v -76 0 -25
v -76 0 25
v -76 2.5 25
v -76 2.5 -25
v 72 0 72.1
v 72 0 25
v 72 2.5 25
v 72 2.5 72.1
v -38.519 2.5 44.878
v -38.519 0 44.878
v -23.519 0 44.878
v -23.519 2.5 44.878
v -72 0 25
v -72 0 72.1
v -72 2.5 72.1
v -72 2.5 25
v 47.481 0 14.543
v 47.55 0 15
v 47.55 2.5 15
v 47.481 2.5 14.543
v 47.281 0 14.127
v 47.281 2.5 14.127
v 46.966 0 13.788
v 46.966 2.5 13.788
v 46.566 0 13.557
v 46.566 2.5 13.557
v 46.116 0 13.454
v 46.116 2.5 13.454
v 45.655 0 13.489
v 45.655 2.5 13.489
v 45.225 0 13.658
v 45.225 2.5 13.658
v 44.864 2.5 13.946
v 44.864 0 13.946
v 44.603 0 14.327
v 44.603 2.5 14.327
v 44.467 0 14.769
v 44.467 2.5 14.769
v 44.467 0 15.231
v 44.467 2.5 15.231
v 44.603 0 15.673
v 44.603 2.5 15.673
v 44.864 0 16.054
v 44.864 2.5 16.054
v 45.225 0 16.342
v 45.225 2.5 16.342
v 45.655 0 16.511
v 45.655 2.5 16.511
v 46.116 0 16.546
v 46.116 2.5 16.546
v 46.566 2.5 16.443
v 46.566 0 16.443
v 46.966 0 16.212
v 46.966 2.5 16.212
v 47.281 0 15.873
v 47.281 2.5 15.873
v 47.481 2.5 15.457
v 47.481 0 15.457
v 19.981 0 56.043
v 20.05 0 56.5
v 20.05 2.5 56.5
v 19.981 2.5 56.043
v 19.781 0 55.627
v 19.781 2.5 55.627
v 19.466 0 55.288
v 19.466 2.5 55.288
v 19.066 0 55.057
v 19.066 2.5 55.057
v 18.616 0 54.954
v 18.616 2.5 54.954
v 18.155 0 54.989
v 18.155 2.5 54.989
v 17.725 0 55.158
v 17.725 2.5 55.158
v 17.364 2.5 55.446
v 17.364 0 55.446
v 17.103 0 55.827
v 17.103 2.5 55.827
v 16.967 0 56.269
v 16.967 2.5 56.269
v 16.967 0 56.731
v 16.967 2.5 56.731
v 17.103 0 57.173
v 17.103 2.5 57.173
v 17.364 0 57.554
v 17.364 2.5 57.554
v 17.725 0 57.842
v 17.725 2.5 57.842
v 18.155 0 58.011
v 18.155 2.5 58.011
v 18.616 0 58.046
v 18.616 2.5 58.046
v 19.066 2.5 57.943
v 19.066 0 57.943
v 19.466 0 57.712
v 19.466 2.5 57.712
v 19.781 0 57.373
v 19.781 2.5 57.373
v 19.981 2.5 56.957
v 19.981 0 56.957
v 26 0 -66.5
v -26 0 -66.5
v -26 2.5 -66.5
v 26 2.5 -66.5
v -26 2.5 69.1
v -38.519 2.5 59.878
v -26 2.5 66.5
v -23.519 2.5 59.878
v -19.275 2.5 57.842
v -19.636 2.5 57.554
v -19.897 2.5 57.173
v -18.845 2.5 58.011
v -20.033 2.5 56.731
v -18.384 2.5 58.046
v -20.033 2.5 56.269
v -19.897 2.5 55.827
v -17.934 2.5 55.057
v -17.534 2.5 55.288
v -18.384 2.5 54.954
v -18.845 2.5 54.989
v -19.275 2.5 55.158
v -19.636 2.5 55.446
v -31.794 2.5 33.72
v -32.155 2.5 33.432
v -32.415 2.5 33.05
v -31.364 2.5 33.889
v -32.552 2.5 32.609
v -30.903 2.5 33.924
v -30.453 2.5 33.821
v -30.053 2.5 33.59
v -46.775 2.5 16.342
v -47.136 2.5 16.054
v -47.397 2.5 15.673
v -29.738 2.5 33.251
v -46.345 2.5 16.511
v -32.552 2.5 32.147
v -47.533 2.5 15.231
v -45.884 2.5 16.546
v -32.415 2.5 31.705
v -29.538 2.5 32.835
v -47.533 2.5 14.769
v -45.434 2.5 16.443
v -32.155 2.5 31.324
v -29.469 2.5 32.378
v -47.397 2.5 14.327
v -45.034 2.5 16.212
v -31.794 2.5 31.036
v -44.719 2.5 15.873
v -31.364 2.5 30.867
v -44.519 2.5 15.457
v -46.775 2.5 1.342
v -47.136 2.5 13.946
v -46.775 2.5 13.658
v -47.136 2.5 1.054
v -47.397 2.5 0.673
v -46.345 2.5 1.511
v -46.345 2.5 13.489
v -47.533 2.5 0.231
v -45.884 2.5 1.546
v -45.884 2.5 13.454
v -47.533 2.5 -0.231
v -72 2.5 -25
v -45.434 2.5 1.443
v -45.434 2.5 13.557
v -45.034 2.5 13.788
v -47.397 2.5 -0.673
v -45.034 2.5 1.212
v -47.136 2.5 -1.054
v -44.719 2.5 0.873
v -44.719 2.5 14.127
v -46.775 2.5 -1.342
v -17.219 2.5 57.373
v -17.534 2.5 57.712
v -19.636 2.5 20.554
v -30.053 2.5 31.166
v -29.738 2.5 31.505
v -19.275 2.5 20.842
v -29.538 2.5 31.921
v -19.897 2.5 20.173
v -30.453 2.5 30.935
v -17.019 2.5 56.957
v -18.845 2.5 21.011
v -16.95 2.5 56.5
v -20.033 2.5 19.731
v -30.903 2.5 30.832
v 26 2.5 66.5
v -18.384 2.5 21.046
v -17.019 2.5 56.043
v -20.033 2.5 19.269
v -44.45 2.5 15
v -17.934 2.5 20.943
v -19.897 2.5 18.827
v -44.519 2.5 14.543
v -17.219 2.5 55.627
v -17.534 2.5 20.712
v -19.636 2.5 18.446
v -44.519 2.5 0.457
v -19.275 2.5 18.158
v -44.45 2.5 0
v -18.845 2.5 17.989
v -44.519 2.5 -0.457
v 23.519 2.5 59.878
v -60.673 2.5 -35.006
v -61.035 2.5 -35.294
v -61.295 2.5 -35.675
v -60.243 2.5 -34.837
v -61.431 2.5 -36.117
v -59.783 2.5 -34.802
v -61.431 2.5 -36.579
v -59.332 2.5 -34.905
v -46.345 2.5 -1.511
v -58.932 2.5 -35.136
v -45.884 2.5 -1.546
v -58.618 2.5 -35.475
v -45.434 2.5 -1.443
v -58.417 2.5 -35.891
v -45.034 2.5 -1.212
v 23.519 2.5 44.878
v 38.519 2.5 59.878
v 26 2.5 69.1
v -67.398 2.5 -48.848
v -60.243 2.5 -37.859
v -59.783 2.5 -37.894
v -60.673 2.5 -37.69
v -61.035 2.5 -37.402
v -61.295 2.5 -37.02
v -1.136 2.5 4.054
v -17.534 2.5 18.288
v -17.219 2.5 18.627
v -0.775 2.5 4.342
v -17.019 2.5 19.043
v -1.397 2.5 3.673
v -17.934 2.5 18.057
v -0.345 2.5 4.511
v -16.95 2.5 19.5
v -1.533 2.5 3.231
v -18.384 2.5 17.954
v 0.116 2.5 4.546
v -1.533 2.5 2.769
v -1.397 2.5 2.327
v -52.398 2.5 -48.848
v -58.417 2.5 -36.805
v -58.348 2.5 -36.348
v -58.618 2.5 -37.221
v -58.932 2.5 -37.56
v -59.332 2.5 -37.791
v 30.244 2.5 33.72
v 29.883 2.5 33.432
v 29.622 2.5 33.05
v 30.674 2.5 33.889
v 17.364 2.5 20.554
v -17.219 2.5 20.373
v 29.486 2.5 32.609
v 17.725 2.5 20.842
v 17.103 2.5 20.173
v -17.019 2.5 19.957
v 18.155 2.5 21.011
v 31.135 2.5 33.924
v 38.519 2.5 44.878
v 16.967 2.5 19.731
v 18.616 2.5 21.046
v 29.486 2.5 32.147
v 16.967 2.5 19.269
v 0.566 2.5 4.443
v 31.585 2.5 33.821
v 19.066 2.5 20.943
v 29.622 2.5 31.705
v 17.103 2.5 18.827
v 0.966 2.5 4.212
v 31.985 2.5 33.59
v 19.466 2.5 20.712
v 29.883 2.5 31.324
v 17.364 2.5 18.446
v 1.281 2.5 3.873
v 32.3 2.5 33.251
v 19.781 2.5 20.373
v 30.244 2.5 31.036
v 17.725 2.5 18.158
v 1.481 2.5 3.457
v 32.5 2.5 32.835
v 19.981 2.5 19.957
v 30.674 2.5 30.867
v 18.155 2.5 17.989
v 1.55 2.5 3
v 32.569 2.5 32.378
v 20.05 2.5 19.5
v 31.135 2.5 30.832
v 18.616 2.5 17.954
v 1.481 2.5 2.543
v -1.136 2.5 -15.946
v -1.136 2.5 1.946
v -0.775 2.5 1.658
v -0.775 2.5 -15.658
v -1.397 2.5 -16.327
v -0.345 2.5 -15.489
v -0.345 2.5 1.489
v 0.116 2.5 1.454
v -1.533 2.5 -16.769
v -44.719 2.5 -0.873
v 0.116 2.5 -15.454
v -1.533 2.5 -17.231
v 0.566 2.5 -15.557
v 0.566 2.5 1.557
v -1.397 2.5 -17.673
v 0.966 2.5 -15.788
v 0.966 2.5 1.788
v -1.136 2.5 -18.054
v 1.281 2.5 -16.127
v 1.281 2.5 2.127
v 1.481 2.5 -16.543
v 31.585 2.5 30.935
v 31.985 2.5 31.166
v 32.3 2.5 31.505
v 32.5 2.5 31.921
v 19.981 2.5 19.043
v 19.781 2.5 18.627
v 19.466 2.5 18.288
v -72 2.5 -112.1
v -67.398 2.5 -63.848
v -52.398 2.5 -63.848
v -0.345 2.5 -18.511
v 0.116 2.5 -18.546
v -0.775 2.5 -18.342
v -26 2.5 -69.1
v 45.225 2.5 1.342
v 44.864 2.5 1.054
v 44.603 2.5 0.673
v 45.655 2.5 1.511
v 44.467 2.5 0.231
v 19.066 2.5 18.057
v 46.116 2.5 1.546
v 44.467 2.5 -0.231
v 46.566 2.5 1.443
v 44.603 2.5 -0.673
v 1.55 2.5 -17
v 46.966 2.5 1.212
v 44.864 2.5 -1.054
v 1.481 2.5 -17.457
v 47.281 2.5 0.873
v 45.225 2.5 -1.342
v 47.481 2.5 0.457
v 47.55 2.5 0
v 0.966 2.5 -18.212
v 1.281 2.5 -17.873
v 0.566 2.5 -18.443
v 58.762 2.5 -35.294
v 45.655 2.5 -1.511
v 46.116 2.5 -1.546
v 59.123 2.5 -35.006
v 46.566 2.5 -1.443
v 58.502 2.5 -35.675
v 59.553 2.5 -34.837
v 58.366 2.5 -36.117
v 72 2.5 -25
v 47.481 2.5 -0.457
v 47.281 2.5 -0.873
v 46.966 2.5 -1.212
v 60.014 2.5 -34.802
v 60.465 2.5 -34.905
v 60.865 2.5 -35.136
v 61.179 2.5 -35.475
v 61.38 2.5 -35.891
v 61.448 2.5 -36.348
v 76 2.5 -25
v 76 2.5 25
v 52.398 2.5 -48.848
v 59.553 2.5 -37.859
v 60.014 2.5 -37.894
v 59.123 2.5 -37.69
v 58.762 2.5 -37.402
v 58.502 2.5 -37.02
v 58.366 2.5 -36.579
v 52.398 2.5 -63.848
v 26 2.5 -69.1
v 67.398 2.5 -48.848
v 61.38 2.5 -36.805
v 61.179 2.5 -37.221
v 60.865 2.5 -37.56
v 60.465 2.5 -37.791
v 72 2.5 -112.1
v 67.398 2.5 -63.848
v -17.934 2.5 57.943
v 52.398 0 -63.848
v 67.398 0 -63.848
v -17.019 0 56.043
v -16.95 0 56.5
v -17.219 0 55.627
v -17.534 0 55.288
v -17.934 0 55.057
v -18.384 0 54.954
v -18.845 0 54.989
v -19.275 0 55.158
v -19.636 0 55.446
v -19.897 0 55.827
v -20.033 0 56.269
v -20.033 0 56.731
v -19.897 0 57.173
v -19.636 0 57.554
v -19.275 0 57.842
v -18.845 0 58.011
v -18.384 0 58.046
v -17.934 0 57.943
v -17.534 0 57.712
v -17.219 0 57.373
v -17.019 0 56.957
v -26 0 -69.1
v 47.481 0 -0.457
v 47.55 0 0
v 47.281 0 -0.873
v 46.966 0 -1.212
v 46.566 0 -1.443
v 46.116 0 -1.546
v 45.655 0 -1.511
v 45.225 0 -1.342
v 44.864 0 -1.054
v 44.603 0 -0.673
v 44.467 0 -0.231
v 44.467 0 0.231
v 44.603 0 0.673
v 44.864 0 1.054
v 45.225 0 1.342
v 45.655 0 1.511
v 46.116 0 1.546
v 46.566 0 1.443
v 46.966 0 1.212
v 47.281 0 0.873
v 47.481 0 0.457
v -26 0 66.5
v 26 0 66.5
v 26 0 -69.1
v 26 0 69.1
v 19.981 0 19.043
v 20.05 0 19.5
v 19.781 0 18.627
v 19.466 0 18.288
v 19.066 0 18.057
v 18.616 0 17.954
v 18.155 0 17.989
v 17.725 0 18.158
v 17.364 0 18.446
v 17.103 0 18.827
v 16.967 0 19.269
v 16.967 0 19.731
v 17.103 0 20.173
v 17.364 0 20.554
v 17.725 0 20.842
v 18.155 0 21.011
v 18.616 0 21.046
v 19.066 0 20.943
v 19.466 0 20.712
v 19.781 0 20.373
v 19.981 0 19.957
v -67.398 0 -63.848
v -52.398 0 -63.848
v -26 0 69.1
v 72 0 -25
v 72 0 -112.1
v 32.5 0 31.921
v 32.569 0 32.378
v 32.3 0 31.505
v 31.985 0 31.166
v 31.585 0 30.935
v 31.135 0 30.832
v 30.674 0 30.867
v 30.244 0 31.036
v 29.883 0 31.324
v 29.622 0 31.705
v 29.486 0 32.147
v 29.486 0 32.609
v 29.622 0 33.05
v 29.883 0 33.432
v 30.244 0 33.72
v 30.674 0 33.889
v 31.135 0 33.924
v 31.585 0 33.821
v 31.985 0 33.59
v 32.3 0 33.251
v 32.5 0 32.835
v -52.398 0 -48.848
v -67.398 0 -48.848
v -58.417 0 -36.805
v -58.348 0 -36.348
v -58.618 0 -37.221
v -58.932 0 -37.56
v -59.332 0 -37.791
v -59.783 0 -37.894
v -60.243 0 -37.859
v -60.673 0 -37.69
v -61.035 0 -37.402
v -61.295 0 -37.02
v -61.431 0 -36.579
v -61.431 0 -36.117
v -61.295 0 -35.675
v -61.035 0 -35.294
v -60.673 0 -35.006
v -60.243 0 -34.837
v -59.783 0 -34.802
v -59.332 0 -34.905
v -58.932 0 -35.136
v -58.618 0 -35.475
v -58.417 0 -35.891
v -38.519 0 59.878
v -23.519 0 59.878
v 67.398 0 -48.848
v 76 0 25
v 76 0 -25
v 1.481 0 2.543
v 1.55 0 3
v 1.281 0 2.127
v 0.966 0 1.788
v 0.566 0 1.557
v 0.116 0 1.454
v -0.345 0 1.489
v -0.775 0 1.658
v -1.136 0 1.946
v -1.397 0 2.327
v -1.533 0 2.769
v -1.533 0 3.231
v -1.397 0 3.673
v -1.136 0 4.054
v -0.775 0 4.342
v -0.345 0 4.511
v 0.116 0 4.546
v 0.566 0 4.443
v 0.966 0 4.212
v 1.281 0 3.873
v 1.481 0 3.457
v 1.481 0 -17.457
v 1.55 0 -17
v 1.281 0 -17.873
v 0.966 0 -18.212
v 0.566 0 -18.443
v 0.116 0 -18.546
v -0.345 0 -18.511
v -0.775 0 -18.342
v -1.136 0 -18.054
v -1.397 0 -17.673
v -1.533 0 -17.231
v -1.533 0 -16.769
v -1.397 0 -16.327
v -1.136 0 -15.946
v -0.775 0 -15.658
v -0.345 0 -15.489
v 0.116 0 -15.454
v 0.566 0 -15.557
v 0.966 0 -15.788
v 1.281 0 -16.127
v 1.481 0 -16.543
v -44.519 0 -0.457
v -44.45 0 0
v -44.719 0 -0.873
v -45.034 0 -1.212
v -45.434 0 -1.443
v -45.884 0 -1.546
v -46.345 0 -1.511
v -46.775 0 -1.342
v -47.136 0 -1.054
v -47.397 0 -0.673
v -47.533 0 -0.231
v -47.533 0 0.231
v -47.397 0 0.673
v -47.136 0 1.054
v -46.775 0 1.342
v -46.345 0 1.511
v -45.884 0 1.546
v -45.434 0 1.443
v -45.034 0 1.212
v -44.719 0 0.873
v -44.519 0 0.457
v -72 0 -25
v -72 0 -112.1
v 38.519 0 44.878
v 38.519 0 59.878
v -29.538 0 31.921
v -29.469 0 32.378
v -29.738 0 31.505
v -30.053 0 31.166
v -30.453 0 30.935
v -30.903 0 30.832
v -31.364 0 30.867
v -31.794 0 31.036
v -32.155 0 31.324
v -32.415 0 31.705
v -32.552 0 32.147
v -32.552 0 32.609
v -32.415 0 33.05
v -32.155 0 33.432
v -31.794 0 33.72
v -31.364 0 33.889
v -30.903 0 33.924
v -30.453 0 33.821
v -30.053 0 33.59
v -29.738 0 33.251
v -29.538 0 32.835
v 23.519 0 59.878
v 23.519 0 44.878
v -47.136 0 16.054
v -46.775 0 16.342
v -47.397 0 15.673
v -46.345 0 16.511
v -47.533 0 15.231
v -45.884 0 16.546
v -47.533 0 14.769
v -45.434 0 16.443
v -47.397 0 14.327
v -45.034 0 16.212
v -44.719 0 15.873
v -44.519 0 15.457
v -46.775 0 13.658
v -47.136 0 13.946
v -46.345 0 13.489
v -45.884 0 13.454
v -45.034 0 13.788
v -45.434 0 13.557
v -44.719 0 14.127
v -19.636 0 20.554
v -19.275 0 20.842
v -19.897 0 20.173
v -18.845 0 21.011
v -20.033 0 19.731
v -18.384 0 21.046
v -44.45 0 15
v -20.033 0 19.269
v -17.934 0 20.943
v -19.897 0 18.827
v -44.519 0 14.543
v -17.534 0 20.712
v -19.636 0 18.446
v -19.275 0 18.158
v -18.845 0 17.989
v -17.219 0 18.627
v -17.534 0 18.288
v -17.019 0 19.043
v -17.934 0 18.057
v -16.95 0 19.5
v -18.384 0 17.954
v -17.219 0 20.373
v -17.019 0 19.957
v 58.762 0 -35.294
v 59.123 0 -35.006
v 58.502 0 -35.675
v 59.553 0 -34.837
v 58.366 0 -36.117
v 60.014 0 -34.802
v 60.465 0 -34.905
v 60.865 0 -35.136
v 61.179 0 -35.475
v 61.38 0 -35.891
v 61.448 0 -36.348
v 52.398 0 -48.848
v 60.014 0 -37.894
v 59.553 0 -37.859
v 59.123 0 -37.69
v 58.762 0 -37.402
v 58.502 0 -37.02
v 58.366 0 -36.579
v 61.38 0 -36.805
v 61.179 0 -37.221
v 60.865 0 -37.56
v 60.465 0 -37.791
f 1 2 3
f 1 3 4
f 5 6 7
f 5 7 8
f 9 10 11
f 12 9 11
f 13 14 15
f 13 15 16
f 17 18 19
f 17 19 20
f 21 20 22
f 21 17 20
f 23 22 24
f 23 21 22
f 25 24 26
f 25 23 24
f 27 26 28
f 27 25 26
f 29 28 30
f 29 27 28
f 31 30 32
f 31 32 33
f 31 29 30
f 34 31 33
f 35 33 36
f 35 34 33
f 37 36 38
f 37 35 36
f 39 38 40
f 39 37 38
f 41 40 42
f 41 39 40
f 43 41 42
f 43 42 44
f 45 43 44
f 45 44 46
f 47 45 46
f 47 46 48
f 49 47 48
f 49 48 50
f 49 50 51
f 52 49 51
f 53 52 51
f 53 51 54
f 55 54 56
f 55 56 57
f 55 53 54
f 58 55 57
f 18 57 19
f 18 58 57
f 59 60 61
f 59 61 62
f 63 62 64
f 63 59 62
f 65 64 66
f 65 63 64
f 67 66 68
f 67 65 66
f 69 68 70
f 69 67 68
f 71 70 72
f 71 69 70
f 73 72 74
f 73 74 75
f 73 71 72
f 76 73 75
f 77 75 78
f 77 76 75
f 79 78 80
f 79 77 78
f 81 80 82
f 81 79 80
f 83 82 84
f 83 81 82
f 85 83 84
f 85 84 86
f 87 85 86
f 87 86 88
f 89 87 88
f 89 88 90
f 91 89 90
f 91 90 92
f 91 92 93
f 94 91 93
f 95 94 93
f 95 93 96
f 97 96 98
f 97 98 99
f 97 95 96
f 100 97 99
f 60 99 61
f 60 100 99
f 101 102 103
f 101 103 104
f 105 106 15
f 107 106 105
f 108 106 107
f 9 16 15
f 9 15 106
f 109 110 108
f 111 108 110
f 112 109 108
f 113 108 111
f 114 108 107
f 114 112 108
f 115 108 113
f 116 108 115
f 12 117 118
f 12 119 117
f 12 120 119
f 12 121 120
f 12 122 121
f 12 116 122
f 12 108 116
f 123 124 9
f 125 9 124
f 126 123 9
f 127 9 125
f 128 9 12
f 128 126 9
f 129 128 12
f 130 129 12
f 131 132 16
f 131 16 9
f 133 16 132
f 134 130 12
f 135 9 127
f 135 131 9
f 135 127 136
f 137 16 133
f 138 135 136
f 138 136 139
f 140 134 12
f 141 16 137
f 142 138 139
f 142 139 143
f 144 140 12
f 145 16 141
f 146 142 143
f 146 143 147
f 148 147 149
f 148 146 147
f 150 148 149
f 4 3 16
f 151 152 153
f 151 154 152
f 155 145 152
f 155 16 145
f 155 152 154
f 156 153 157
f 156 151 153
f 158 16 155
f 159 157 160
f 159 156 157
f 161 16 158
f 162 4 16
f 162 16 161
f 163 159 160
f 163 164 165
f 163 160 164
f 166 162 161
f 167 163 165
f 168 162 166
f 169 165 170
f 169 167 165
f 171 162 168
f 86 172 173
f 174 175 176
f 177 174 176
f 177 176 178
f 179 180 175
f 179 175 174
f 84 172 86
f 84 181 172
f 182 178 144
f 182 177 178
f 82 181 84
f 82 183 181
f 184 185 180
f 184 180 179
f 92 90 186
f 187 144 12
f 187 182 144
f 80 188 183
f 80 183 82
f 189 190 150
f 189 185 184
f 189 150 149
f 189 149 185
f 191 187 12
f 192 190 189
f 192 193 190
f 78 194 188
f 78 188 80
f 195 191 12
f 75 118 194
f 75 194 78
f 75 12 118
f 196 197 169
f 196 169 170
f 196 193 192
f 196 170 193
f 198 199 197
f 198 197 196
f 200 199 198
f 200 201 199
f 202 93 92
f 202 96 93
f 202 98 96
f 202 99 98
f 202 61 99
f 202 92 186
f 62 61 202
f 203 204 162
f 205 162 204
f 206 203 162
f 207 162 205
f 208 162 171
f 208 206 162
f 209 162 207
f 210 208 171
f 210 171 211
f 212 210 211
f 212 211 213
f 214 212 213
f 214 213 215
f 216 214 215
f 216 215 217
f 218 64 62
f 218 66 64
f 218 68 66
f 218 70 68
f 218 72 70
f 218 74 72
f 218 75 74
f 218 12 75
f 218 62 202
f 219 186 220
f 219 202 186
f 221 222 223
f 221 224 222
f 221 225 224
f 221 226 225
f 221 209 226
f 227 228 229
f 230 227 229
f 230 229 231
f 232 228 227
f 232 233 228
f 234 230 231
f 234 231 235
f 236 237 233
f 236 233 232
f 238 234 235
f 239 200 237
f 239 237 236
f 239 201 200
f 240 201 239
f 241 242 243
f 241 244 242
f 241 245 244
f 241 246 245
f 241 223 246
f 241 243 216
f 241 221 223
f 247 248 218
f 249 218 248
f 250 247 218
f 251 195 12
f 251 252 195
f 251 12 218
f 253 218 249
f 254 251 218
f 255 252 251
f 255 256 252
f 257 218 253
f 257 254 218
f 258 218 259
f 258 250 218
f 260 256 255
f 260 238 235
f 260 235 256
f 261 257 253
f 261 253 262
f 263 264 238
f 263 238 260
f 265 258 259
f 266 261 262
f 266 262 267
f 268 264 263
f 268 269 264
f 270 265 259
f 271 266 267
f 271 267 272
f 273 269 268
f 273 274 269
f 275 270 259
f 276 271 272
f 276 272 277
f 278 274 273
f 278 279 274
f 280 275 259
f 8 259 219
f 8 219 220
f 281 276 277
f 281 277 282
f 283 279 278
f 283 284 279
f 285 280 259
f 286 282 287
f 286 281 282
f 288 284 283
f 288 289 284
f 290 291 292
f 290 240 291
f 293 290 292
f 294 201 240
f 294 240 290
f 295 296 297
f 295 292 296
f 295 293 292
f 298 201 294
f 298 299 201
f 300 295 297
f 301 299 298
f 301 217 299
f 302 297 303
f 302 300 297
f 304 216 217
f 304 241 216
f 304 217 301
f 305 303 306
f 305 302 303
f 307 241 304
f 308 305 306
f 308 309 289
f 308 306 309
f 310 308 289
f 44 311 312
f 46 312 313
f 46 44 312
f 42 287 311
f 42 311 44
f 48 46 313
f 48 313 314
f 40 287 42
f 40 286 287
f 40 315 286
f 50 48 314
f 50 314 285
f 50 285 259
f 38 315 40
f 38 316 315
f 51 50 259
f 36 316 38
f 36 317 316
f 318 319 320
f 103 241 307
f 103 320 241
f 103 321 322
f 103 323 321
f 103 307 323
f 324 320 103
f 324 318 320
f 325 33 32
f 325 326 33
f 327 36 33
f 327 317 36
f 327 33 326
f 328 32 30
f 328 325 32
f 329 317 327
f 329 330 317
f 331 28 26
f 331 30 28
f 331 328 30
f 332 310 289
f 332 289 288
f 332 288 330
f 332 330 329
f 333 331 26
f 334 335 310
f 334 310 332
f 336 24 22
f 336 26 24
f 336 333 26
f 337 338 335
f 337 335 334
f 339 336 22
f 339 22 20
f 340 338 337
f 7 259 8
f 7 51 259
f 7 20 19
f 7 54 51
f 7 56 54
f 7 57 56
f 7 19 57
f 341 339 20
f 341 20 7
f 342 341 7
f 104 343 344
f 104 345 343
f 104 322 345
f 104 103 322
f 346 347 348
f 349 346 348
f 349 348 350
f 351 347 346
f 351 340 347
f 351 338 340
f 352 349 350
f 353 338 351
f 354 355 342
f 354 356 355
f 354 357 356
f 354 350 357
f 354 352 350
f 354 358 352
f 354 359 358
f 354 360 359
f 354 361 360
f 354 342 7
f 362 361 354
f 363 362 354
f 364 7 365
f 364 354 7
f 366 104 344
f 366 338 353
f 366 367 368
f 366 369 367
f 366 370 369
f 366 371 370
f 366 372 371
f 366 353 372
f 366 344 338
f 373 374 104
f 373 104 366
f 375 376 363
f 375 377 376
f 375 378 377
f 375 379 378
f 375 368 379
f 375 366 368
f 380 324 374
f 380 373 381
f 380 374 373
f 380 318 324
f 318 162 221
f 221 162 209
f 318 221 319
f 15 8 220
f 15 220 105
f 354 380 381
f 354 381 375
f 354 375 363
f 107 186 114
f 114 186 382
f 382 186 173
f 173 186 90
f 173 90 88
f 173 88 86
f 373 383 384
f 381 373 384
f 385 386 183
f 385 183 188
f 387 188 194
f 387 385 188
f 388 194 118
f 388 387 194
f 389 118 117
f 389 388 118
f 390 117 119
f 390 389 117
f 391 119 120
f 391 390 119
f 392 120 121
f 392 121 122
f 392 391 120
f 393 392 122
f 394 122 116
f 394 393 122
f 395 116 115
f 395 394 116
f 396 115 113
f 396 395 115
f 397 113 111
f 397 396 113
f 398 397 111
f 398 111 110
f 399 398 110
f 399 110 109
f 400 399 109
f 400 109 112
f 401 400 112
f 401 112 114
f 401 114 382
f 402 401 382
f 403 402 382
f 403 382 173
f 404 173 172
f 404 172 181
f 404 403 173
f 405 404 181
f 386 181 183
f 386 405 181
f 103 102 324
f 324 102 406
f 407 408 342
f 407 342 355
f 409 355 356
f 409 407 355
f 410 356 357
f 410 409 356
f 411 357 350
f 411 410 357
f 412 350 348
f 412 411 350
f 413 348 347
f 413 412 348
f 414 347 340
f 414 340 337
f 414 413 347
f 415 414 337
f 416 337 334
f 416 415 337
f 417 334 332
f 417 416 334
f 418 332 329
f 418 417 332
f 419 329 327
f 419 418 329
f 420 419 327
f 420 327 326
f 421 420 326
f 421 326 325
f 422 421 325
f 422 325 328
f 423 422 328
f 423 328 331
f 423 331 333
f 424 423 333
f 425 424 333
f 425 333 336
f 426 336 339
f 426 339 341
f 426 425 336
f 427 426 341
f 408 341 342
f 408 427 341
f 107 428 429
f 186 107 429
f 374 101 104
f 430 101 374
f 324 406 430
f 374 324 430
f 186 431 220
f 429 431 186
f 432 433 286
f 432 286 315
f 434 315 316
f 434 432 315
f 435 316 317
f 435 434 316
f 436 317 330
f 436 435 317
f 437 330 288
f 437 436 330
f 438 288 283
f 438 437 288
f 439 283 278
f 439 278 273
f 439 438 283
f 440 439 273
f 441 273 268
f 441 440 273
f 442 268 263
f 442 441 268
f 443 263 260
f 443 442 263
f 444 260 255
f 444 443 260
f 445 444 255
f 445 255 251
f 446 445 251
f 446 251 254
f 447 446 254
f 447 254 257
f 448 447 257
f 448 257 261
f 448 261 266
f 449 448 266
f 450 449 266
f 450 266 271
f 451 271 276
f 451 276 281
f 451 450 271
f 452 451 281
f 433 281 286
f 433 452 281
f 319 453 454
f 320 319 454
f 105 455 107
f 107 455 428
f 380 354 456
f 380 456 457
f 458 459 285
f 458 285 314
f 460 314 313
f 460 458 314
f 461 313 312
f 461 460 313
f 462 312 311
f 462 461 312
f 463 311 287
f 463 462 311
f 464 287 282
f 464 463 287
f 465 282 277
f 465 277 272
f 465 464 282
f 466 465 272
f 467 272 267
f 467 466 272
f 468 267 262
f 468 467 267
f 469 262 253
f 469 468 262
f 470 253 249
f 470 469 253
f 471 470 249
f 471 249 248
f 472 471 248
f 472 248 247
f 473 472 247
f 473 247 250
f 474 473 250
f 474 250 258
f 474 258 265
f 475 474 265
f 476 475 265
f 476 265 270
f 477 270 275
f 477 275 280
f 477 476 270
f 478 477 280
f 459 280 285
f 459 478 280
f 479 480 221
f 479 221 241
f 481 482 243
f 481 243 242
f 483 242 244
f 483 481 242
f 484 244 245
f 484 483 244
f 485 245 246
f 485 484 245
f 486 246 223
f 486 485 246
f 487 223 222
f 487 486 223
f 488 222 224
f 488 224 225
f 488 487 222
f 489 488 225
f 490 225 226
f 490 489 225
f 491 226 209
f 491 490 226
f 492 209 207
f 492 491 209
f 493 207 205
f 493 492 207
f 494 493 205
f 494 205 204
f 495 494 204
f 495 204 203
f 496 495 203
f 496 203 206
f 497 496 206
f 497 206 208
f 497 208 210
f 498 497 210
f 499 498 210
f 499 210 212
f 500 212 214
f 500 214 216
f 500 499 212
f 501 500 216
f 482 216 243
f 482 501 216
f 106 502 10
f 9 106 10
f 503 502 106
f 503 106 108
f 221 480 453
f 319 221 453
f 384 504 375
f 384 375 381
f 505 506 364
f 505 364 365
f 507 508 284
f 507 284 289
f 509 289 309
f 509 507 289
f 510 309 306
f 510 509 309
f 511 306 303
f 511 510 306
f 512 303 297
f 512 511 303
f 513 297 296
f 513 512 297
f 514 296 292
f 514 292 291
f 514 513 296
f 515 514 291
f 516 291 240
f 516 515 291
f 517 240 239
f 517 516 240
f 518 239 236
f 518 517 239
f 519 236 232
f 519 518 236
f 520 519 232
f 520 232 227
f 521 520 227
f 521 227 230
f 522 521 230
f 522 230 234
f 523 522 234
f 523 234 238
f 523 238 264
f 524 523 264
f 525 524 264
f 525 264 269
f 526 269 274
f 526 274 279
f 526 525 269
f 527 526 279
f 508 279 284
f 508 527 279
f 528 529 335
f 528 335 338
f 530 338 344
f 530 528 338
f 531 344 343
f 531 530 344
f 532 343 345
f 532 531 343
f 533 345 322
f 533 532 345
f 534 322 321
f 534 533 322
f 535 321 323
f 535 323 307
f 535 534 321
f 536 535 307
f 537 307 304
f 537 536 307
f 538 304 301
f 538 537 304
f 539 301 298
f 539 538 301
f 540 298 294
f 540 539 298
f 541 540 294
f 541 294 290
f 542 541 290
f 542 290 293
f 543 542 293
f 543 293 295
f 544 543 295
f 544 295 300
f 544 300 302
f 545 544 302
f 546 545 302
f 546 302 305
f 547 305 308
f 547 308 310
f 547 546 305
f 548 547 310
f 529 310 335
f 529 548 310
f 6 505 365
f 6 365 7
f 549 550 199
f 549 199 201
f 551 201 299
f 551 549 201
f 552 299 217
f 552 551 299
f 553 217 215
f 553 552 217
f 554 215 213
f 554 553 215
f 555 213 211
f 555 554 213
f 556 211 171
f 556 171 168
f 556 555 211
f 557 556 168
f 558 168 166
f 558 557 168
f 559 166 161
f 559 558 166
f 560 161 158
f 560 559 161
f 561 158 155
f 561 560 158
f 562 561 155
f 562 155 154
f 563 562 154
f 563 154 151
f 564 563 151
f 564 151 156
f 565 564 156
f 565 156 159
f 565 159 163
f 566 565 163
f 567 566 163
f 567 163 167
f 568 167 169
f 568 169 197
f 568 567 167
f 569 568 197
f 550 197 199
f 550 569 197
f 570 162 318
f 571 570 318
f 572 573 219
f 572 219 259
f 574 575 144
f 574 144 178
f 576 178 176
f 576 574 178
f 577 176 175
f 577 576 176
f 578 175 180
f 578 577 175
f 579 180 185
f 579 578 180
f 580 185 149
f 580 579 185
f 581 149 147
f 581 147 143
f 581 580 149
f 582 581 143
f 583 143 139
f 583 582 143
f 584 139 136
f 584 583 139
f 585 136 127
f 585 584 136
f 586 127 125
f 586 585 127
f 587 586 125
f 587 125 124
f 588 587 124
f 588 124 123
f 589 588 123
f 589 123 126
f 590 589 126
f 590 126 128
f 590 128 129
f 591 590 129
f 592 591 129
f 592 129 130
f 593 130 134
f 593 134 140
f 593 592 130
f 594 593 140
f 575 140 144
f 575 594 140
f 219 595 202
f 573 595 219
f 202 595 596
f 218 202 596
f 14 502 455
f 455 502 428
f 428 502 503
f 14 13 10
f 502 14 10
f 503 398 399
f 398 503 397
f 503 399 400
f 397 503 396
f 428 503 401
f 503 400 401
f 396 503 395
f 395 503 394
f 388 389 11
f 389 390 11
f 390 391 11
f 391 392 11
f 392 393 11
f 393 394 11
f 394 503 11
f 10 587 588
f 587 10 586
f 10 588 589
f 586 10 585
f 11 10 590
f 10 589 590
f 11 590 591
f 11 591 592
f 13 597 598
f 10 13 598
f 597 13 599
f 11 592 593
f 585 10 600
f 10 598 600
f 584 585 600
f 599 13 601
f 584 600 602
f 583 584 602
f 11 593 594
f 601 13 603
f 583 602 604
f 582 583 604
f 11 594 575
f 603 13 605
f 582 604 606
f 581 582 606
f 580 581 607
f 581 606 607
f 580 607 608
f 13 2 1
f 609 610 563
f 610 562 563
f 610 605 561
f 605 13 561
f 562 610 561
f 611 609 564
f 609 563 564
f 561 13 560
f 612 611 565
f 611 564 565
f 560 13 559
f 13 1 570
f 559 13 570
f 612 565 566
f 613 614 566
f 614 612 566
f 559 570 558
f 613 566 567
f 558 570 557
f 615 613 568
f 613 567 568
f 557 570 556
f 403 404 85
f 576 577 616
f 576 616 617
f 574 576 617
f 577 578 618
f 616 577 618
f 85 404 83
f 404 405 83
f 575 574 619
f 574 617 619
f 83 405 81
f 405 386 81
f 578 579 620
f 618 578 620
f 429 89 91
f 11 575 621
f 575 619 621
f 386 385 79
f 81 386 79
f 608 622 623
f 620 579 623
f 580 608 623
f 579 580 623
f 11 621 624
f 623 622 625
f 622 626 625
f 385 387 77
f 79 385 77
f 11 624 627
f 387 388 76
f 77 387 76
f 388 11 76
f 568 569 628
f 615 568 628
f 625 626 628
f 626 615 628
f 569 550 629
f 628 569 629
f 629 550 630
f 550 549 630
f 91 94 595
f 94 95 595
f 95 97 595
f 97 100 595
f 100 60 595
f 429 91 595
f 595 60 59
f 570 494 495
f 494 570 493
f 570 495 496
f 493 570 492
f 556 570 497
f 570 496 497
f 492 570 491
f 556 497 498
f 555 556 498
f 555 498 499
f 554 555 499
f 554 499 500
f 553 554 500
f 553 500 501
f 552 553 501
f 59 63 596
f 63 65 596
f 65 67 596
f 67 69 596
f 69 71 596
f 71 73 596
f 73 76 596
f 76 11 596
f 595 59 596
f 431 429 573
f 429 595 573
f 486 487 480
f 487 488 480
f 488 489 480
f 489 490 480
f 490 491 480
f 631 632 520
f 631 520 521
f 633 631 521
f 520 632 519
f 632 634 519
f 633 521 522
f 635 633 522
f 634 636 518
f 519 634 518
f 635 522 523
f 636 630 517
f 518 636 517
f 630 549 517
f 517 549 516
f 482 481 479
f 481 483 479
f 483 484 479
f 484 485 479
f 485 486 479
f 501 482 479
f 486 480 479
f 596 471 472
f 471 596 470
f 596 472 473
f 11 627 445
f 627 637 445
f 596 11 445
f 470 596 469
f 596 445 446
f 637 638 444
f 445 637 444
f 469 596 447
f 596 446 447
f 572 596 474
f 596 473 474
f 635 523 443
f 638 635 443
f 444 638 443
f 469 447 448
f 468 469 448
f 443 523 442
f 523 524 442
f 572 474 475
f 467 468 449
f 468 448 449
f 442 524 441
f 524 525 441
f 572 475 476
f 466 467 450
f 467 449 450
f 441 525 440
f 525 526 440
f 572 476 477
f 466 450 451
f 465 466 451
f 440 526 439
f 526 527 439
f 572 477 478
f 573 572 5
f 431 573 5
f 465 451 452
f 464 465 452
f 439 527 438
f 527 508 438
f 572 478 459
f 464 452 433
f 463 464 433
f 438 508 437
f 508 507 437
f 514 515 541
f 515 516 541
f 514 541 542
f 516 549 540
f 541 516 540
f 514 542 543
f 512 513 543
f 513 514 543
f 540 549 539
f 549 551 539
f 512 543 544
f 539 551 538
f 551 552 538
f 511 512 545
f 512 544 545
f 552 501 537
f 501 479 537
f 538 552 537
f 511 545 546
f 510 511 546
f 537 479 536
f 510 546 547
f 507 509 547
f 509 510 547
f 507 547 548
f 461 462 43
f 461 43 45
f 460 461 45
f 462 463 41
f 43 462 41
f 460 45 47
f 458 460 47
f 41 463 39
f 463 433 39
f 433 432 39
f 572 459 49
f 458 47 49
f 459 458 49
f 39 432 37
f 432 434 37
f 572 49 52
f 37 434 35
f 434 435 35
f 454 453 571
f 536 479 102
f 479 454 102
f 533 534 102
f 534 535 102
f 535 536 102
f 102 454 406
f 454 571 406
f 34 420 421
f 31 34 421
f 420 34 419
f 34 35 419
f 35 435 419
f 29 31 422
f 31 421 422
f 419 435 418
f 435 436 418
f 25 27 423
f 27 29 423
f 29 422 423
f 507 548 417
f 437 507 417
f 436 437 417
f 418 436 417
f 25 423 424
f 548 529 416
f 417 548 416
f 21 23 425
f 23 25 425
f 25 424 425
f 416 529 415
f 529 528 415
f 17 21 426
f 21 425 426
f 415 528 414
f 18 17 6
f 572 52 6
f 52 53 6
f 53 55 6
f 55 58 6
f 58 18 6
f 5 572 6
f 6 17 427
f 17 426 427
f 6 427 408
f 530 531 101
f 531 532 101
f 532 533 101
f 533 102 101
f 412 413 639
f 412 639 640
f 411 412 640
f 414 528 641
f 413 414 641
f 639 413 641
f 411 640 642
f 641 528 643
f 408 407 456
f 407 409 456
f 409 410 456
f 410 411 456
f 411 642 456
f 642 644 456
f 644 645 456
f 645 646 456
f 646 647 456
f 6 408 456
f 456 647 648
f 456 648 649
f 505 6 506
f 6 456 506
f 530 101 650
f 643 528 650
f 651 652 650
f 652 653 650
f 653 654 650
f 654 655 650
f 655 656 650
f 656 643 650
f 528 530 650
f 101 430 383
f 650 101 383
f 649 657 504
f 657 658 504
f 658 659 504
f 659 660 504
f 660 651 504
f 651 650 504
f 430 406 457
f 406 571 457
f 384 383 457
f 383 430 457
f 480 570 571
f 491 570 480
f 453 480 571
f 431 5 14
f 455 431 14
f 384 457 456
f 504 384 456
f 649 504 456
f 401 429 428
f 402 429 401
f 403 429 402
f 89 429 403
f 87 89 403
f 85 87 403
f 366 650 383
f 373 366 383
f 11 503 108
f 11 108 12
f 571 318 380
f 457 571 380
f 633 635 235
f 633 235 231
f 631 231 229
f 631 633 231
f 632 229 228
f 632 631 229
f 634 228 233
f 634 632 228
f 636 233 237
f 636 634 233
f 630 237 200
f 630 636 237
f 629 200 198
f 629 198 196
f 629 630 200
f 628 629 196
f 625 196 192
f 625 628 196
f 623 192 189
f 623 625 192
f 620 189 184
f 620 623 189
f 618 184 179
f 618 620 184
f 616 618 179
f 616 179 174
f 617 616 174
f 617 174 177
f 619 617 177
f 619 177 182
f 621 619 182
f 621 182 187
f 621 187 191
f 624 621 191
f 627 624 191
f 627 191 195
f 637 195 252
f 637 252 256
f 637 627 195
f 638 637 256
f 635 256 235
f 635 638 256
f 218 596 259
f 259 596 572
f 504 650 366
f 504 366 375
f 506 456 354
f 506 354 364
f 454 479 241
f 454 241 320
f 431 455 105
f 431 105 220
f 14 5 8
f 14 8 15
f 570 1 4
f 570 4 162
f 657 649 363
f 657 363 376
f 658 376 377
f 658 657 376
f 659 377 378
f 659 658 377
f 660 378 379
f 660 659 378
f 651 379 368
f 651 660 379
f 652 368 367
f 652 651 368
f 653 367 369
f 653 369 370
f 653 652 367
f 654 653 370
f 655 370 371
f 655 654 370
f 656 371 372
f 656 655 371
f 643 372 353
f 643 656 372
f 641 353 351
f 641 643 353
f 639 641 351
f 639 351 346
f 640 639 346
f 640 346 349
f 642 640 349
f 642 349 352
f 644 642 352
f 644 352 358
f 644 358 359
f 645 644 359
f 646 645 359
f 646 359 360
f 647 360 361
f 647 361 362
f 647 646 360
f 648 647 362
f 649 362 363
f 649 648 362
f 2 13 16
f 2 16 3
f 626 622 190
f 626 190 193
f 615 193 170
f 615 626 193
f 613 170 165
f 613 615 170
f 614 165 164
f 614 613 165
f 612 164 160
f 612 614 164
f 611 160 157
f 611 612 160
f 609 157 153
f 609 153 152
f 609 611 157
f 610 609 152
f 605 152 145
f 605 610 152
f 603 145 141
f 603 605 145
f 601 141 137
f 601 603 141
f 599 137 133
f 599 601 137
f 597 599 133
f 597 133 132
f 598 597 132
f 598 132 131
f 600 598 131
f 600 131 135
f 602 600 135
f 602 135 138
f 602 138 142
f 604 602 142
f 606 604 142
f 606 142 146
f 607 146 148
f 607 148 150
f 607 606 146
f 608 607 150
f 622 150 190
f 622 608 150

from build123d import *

# Parameters (mm, degrees)
SKETCH1_R           = 1.55
SKETCH1_W           = 15
SKETCH1_H           = 15
SKETCH1_W_2         = 52
SKETCH1_H_2         = 2.6
BOSS_EXTRUDE1_DEPTH = 2.5
SKETCH2_W           = 144
SKETCH2_H           = 40
BOSS_EXTRUDE2_DEPTH = 2.5


with BuildPart() as part:
    # Sketch1 → Boss-Extrude1 (new body)
    with BuildSketch(Plane(origin=(0, 0, 0), x_dir=(1, 0, 0), z_dir=(0, 1, 0))):
        Polygon((-72, -25), (-76, -25), (-76, 25), (-72, 25), (-72, 72.1), (72, 72.1), (72, 25), (76, 25), (76, -25), (72, -25), (72, -72.1), (-72, -72.1), align=None)
        with Locations((-18.5, -56.5)):
            Circle(SKETCH1_R, mode=Mode.SUBTRACT)
        with Locations((-18.5, -19.5)):
            Circle(SKETCH1_R, mode=Mode.SUBTRACT)
        with Locations((18.5, -19.5)):
            Circle(SKETCH1_R, mode=Mode.SUBTRACT)
        with Locations((18.5, -56.5)):
            Circle(SKETCH1_R, mode=Mode.SUBTRACT)
        with Locations((0, -3)):
            Circle(SKETCH1_R, mode=Mode.SUBTRACT)
        with Locations((0, 17)):
            Circle(SKETCH1_R, mode=Mode.SUBTRACT)
        with Locations((-59.898406921, 36.347928242)):
            Circle(SKETCH1_R, mode=Mode.SUBTRACT)
        with Locations((59.898406921, 36.347928242)):
            Circle(SKETCH1_R, mode=Mode.SUBTRACT)
        with Locations((31.018932052, -32.377895768)):
            Circle(SKETCH1_R, mode=Mode.SUBTRACT)
        with Locations((-31.018932052, -32.377895768)):
            Circle(SKETCH1_R, mode=Mode.SUBTRACT)
        with Locations((-46, -15)):
            Circle(SKETCH1_R, mode=Mode.SUBTRACT)
        with Locations((-46, 0)):
            Circle(SKETCH1_R, mode=Mode.SUBTRACT)
        with Locations((46, -15)):
            Circle(SKETCH1_R, mode=Mode.SUBTRACT)
        with Locations((46, 0)):
            Circle(SKETCH1_R, mode=Mode.SUBTRACT)
        with Locations((59.898406921, 56.347928242)):
            Rectangle(SKETCH1_W, SKETCH1_H, mode=Mode.SUBTRACT)
        with Locations((-59.898406921, 56.347928242)):
            Rectangle(SKETCH1_W, SKETCH1_H, mode=Mode.SUBTRACT)
        with Locations((31.018932052, -52.377895768)):
            Rectangle(SKETCH1_W, SKETCH1_H, mode=Mode.SUBTRACT)
        with Locations((-31.018932052, -52.377895768)):
            Rectangle(SKETCH1_W, SKETCH1_H, mode=Mode.SUBTRACT)
        with Locations((0, -67.8)):
            Rectangle(SKETCH1_W_2, SKETCH1_H_2, mode=Mode.SUBTRACT)
        with Locations((0, 67.8)):
            Rectangle(SKETCH1_W_2, SKETCH1_H_2, mode=Mode.SUBTRACT)
    extrude(amount=BOSS_EXTRUDE1_DEPTH)

    # Sketch2 → Boss-Extrude2 (add)
    with BuildSketch(Plane(origin=(0, 2.5, 0), x_dir=(1, 0, 0), z_dir=(0, 1, 0))):
        with Locations((0, 92.1)):
            Rectangle(SKETCH2_W, SKETCH2_H)
    extrude(amount=-BOSS_EXTRUDE2_DEPTH)


solid = part.part
